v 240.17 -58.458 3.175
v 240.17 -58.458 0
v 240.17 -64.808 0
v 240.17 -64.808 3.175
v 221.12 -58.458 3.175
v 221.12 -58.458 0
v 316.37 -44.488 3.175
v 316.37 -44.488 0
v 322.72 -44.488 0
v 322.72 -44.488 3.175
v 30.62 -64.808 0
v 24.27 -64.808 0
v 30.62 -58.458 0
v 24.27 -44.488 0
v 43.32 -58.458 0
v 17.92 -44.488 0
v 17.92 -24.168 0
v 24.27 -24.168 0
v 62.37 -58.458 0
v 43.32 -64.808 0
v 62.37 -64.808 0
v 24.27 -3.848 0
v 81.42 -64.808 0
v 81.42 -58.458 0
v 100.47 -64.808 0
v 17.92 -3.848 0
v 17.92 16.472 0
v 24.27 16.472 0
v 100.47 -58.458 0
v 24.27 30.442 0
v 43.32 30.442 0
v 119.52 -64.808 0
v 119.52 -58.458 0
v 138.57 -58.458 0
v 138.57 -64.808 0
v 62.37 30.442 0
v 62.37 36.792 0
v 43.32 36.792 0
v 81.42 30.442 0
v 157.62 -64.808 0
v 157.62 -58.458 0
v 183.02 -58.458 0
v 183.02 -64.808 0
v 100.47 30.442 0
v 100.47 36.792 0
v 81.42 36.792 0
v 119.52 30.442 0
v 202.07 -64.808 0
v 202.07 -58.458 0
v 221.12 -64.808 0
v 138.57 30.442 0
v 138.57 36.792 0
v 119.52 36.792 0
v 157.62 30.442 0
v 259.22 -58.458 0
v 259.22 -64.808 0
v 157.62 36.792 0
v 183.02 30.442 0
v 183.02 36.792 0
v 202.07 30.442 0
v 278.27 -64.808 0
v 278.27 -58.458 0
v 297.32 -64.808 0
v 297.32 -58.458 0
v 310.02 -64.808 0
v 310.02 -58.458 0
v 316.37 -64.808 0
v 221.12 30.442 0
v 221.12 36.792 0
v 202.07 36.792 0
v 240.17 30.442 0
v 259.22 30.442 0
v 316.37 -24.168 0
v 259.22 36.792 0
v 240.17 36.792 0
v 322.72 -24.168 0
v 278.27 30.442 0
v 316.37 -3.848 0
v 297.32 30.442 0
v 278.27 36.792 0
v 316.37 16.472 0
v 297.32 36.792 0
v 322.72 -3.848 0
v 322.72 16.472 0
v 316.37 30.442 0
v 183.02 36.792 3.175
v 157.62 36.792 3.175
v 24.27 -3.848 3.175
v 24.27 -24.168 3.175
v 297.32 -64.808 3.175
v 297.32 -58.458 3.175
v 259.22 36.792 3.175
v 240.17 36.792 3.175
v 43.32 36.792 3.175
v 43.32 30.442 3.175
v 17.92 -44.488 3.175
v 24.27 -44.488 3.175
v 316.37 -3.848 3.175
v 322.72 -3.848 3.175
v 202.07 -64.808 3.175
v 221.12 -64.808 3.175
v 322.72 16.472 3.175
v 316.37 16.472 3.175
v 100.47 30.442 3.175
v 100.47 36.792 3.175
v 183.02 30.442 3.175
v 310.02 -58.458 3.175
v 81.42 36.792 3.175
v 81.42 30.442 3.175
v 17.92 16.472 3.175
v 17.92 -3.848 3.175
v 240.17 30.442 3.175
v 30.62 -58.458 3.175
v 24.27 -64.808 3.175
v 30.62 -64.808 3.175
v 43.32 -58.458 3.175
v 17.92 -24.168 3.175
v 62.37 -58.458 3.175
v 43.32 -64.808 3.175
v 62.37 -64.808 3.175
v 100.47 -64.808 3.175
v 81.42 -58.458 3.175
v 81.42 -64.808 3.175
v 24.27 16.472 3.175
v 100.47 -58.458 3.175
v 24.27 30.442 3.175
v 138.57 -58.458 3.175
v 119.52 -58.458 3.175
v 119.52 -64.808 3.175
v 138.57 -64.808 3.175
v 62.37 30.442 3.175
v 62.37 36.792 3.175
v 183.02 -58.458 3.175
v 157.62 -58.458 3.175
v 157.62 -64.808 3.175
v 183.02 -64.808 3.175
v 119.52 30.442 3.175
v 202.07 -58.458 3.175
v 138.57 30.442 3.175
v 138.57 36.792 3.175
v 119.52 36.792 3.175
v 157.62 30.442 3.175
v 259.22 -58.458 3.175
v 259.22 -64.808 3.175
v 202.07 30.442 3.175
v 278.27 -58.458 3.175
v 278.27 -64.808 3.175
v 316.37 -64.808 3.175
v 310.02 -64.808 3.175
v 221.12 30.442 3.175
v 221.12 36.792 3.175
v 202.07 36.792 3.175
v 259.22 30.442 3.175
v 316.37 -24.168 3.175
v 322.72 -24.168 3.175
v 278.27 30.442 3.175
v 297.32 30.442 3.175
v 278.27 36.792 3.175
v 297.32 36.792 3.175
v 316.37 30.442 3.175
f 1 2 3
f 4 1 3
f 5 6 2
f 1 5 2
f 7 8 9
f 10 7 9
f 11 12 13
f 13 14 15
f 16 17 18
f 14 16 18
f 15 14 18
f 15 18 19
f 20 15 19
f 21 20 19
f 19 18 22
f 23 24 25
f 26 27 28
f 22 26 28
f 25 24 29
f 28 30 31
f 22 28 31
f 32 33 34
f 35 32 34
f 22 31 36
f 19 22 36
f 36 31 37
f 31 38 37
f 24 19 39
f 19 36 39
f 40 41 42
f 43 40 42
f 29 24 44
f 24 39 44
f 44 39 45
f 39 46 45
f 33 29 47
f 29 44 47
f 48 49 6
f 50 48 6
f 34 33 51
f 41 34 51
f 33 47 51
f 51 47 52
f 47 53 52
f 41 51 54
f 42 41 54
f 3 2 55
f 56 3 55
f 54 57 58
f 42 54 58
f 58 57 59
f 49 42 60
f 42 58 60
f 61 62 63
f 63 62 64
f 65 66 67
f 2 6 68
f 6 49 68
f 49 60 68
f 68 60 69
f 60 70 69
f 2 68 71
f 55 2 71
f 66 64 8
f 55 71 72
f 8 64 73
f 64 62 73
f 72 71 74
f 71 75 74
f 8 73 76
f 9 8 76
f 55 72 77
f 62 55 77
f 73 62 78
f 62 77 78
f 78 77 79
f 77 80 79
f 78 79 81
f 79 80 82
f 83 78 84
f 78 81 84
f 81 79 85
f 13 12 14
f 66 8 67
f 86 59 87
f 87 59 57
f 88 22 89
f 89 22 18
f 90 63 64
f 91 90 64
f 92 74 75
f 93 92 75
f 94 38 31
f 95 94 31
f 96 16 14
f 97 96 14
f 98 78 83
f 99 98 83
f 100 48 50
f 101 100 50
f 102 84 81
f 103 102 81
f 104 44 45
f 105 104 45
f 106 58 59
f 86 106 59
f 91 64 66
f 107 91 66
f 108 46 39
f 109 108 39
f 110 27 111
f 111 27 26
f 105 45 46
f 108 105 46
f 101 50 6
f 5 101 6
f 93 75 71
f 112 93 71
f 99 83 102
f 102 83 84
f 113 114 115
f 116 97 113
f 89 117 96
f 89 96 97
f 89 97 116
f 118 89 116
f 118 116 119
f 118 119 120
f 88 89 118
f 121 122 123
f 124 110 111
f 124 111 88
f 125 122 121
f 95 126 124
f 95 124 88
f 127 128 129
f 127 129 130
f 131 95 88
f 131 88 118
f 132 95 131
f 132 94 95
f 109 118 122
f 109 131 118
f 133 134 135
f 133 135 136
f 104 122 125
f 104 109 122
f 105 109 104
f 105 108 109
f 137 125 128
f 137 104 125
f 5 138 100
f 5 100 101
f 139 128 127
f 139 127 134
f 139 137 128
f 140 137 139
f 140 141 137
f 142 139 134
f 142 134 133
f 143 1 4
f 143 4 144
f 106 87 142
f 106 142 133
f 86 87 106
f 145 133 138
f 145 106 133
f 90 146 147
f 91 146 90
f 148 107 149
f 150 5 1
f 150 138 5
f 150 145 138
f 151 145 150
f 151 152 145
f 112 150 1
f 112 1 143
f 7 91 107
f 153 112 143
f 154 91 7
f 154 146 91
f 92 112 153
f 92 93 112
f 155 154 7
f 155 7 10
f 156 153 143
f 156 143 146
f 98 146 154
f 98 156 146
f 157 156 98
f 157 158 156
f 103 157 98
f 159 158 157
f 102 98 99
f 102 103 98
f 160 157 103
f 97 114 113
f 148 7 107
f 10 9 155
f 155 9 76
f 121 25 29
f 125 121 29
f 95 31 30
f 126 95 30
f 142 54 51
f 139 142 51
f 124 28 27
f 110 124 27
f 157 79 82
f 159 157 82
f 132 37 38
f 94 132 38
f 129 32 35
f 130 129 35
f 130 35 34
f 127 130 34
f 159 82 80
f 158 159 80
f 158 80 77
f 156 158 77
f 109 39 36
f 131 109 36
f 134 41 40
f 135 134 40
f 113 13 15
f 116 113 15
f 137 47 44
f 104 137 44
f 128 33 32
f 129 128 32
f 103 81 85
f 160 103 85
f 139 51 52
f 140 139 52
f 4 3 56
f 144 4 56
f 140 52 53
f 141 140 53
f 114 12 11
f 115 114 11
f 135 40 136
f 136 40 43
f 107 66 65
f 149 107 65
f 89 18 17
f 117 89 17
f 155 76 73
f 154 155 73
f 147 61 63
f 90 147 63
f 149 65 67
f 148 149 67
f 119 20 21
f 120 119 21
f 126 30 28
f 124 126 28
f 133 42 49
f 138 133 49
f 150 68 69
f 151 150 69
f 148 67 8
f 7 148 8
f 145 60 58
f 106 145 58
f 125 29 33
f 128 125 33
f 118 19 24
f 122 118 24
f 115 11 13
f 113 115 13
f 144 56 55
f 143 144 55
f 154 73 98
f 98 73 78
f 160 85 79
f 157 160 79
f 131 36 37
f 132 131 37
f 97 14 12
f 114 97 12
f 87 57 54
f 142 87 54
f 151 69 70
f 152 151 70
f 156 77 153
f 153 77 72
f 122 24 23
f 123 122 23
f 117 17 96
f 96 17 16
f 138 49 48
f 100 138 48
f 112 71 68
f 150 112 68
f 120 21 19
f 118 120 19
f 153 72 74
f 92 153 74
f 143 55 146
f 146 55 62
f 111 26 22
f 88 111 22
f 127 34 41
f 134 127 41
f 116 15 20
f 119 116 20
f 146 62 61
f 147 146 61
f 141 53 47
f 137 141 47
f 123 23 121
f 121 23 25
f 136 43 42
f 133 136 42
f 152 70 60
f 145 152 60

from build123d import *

# Parameters (mm, degrees)
F1_DEPTH = 3.175


with BuildPart() as f1:
    # F0 (on Top) → F1 (new body)
    with BuildSketch(Plane.XY):
        Polygon((24.269844, -44.48778), (24.269844, -64.80778), (30.619844, -64.80778), (30.619844, -58.45778), (43.319844, -58.45778), (43.319844, -64.80778), (62.369844, -64.80778), (62.369844, -58.45778), (81.419844, -58.45778), (81.419844, -64.80778), (100.469844, -64.80778), (100.469844, -58.45778), (119.519844, -58.45778), (119.519844, -64.80778), (138.569844, -64.80778), (138.569844, -58.45778), (157.619844, -58.45778), (157.619844, -64.80778), (170.319844, -64.80778), (183.019844, -64.80778), (183.019844, -58.45778), (202.069844, -58.45778), (202.069844, -64.80778), (221.119844, -64.80778), (221.119844, -58.45778), (240.169844, -58.45778), (240.169844, -64.80778), (259.219844, -64.80778), (259.219844, -58.45778), (278.269844, -58.45778), (278.269844, -64.80778), (297.319844, -64.80778), (297.319844, -58.45778), (310.019844, -58.45778), (310.019844, -64.80778), (316.369844, -64.80778), (316.369844, -44.48778), (322.719844, -44.48778), (322.719844, -24.16778), (316.369844, -24.16778), (316.369844, -3.84778), (322.719844, -3.84778), (322.719844, 16.47222), (316.369844, 16.47222), (316.369844, 30.44222), (297.319844, 30.44222), (297.319844, 36.79222), (278.269844, 36.79222), (278.269844, 30.44222), (259.219844, 30.44222), (259.219844, 36.79222), (240.169844, 36.79222), (240.169844, 30.44222), (221.119844, 30.44222), (221.119844, 36.79222), (202.069844, 36.79222), (202.069844, 30.44222), (183.019844, 30.44222), (183.019844, 36.79222), (170.319844, 36.79222), (157.619844, 36.79222), (157.619844, 30.44222), (138.569844, 30.44222), (138.569844, 36.79222), (119.519844, 36.79222), (119.519844, 30.44222), (100.469844, 30.44222), (100.469844, 36.79222), (81.419844, 36.79222), (81.419844, 30.44222), (62.369844, 30.44222), (62.369844, 36.79222), (43.319844, 36.79222), (43.319844, 30.44222), (24.269844, 30.44222), (24.269844, 16.47222), (17.919844, 16.47222), (17.919844, -3.84778), (24.269844, -3.84778), (24.269844, -24.16778), (17.919844, -24.16778), (17.919844, -44.48778), align=None)
    extrude(amount=F1_DEPTH)


solid = f1.part
